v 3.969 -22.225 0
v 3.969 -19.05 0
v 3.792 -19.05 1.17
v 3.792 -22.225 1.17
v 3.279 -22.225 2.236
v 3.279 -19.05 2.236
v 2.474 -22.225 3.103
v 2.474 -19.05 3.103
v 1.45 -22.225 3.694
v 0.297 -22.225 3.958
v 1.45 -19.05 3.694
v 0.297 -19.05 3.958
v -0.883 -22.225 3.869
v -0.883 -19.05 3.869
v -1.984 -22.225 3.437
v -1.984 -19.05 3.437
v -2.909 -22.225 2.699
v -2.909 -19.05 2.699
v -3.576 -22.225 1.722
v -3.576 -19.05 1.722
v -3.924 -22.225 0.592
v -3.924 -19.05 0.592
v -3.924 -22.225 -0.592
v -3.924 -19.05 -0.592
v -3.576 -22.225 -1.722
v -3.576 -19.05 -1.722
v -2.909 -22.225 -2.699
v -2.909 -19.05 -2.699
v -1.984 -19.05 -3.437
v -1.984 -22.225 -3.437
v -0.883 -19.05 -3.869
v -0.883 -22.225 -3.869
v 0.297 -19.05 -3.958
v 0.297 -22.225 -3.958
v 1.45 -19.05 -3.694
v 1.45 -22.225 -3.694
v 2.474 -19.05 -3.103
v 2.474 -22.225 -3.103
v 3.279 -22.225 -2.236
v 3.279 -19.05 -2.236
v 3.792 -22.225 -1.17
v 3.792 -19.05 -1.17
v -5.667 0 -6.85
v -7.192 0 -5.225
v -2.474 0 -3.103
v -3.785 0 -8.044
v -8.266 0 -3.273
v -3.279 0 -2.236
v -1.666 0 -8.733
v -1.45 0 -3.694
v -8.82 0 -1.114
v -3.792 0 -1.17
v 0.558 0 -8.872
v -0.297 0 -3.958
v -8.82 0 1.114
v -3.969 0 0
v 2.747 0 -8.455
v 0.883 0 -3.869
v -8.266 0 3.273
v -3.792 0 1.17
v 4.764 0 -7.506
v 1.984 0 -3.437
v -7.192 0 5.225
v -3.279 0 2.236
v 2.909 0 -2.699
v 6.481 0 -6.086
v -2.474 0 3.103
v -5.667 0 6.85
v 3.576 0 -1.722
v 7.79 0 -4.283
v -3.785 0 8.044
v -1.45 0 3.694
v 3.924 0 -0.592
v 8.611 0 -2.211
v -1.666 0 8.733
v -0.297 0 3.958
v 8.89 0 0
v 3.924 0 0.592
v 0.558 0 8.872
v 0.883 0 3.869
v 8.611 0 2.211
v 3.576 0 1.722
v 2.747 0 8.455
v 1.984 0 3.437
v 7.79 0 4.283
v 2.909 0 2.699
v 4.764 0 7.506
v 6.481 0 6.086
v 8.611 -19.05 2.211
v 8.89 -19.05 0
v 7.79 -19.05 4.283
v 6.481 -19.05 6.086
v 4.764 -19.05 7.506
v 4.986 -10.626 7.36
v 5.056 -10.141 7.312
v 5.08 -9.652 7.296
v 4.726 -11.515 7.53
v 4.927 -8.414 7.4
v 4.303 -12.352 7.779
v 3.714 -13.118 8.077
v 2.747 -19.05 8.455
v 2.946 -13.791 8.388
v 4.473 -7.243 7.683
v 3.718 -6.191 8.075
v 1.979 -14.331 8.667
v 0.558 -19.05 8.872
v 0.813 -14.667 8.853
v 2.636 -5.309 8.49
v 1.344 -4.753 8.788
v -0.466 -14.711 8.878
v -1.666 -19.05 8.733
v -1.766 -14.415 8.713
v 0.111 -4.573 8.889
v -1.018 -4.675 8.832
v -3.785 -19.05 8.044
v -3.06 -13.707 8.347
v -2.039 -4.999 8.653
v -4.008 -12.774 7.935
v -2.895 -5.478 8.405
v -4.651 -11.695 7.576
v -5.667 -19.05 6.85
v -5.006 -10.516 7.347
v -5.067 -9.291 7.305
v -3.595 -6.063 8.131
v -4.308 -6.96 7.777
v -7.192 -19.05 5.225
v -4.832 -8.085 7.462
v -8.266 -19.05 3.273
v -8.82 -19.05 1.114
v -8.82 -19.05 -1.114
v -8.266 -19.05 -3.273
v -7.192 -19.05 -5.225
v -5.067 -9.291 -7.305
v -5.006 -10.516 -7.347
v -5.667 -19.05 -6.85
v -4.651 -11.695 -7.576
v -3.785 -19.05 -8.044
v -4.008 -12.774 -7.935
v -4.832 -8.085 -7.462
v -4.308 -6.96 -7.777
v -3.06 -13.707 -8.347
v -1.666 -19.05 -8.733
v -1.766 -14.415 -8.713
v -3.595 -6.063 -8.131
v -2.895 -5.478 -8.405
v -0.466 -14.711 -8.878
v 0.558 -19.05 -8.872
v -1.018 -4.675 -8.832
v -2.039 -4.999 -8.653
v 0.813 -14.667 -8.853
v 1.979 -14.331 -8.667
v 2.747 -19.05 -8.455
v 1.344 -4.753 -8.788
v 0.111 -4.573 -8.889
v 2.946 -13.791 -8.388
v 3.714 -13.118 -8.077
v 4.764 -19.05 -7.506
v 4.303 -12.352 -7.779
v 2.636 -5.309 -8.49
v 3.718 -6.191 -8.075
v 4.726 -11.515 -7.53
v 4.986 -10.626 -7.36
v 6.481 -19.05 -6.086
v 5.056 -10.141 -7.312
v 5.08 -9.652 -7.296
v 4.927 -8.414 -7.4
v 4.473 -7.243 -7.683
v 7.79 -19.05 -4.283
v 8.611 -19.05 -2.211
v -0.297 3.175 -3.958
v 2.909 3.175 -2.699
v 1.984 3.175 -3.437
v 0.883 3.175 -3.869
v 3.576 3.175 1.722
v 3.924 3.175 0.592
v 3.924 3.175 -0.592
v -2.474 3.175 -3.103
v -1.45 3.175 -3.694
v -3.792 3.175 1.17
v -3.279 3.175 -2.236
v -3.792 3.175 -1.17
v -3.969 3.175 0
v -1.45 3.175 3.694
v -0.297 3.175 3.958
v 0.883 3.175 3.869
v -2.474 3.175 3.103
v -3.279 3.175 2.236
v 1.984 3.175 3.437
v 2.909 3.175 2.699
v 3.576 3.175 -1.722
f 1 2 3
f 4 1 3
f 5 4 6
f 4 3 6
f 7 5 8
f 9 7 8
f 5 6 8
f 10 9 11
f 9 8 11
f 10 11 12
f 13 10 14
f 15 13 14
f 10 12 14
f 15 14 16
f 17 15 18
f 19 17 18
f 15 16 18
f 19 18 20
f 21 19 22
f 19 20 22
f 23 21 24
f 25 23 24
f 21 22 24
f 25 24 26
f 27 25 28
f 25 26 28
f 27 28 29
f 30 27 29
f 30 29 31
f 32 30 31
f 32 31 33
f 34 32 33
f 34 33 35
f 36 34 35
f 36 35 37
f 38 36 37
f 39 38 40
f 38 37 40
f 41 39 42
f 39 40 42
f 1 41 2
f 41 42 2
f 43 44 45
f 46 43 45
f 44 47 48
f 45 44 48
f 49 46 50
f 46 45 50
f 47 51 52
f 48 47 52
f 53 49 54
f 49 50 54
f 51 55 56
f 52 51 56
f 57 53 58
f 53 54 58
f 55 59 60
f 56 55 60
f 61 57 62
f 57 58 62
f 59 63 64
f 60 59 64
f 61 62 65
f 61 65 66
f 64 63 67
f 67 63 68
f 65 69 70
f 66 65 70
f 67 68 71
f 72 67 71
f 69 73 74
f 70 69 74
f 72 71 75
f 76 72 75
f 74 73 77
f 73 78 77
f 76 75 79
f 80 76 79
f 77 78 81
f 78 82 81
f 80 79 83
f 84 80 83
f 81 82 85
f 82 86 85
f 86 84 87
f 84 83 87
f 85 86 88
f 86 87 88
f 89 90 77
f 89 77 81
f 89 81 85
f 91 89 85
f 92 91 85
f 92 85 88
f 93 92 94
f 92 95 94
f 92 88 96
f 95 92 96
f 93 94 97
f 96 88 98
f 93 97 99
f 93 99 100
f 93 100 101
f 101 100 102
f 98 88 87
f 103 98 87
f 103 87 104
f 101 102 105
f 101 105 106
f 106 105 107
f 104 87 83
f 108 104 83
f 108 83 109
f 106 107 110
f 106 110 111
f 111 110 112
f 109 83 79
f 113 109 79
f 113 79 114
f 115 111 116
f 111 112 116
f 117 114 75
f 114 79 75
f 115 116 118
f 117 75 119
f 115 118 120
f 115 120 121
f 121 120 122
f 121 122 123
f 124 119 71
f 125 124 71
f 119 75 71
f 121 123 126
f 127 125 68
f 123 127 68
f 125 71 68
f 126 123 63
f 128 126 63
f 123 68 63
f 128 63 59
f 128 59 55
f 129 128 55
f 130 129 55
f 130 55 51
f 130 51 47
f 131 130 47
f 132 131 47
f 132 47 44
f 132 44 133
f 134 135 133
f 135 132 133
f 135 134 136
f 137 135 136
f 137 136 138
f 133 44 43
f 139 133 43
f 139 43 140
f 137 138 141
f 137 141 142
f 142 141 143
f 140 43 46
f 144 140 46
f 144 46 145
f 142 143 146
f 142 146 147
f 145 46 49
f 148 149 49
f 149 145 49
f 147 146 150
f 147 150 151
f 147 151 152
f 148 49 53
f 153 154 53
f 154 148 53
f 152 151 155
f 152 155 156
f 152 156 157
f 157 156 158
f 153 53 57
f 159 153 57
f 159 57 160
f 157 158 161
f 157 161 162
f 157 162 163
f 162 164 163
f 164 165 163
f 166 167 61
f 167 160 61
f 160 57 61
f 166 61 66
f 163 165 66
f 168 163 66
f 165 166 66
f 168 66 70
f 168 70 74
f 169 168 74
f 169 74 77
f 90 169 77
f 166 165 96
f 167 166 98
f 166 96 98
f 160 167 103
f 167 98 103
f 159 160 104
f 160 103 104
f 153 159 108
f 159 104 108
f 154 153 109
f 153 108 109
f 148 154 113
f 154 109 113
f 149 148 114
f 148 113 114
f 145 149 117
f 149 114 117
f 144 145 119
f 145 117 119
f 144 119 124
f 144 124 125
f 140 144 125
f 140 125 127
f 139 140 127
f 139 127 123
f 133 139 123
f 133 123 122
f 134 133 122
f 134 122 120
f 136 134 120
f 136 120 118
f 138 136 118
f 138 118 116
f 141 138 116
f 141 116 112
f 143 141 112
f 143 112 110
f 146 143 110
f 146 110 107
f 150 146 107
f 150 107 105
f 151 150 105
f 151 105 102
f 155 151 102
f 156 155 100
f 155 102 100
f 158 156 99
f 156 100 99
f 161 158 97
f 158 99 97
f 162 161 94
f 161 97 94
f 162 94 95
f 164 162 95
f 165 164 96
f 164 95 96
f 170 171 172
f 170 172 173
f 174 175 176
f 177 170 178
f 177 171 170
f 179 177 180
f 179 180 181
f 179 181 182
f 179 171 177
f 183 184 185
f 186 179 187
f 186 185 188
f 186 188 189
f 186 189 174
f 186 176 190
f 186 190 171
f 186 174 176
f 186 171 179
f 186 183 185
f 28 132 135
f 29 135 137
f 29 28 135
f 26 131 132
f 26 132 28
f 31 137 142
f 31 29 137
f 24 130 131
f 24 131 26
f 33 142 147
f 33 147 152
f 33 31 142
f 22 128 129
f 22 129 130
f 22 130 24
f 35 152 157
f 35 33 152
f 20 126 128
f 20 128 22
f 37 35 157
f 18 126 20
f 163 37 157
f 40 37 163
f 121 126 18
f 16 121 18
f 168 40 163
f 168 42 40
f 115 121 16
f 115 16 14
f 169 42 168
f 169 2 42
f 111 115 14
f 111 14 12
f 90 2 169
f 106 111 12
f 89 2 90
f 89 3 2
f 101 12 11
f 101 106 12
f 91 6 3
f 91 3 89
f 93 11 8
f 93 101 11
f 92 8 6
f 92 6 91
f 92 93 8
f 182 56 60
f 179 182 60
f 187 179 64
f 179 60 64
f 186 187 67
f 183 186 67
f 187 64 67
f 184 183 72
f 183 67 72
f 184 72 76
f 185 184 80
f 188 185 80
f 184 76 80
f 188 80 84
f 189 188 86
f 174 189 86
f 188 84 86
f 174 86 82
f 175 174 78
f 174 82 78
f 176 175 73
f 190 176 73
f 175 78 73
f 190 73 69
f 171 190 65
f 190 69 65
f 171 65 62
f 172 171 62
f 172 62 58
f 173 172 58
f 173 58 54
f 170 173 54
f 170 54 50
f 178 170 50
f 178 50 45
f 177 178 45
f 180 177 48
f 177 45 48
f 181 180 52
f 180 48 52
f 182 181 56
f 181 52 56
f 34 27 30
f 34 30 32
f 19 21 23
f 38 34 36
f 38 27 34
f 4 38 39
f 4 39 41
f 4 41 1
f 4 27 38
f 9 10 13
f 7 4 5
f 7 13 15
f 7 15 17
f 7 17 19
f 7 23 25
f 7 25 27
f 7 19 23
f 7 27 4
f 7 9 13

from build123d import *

# Parameters (mm, degrees)
F0_R     = 8.89
F1_DEPTH = 19.05
F2_R     = 3.96875
F3_DEPTH = 3.175
F4_R     = 3.96875
F5_DEPTH = 3.175
F7_R     = 5.08
F8_DEPTH = 25.4


with BuildPart() as f1:
    # F0 (on Front) → F1 (new body)
    with BuildSketch(Plane.XZ):
        Circle(F0_R)
    extrude(amount=F1_DEPTH)

    # F2 (on face) → F3 (join)
    with BuildSketch(Plane.XZ.offset(19.05)):
        Circle(F2_R)
    extrude(amount=F3_DEPTH)

    # F4 (on face) → F5 (join)
    with BuildSketch(Plane(origin=(0, 0, 0), x_dir=(-1, 0, 0), z_dir=(0, 1, 0))):
        Circle(F4_R)
    extrude(amount=F5_DEPTH)

    # F7 (on offset) → F8 (cut)
    with BuildSketch(Plane.XY.offset(10.16)):
        with Locations((0, -9.652)):
            Circle(F7_R)
    extrude(amount=-F8_DEPTH, mode=Mode.SUBTRACT)


solid = f1.part
